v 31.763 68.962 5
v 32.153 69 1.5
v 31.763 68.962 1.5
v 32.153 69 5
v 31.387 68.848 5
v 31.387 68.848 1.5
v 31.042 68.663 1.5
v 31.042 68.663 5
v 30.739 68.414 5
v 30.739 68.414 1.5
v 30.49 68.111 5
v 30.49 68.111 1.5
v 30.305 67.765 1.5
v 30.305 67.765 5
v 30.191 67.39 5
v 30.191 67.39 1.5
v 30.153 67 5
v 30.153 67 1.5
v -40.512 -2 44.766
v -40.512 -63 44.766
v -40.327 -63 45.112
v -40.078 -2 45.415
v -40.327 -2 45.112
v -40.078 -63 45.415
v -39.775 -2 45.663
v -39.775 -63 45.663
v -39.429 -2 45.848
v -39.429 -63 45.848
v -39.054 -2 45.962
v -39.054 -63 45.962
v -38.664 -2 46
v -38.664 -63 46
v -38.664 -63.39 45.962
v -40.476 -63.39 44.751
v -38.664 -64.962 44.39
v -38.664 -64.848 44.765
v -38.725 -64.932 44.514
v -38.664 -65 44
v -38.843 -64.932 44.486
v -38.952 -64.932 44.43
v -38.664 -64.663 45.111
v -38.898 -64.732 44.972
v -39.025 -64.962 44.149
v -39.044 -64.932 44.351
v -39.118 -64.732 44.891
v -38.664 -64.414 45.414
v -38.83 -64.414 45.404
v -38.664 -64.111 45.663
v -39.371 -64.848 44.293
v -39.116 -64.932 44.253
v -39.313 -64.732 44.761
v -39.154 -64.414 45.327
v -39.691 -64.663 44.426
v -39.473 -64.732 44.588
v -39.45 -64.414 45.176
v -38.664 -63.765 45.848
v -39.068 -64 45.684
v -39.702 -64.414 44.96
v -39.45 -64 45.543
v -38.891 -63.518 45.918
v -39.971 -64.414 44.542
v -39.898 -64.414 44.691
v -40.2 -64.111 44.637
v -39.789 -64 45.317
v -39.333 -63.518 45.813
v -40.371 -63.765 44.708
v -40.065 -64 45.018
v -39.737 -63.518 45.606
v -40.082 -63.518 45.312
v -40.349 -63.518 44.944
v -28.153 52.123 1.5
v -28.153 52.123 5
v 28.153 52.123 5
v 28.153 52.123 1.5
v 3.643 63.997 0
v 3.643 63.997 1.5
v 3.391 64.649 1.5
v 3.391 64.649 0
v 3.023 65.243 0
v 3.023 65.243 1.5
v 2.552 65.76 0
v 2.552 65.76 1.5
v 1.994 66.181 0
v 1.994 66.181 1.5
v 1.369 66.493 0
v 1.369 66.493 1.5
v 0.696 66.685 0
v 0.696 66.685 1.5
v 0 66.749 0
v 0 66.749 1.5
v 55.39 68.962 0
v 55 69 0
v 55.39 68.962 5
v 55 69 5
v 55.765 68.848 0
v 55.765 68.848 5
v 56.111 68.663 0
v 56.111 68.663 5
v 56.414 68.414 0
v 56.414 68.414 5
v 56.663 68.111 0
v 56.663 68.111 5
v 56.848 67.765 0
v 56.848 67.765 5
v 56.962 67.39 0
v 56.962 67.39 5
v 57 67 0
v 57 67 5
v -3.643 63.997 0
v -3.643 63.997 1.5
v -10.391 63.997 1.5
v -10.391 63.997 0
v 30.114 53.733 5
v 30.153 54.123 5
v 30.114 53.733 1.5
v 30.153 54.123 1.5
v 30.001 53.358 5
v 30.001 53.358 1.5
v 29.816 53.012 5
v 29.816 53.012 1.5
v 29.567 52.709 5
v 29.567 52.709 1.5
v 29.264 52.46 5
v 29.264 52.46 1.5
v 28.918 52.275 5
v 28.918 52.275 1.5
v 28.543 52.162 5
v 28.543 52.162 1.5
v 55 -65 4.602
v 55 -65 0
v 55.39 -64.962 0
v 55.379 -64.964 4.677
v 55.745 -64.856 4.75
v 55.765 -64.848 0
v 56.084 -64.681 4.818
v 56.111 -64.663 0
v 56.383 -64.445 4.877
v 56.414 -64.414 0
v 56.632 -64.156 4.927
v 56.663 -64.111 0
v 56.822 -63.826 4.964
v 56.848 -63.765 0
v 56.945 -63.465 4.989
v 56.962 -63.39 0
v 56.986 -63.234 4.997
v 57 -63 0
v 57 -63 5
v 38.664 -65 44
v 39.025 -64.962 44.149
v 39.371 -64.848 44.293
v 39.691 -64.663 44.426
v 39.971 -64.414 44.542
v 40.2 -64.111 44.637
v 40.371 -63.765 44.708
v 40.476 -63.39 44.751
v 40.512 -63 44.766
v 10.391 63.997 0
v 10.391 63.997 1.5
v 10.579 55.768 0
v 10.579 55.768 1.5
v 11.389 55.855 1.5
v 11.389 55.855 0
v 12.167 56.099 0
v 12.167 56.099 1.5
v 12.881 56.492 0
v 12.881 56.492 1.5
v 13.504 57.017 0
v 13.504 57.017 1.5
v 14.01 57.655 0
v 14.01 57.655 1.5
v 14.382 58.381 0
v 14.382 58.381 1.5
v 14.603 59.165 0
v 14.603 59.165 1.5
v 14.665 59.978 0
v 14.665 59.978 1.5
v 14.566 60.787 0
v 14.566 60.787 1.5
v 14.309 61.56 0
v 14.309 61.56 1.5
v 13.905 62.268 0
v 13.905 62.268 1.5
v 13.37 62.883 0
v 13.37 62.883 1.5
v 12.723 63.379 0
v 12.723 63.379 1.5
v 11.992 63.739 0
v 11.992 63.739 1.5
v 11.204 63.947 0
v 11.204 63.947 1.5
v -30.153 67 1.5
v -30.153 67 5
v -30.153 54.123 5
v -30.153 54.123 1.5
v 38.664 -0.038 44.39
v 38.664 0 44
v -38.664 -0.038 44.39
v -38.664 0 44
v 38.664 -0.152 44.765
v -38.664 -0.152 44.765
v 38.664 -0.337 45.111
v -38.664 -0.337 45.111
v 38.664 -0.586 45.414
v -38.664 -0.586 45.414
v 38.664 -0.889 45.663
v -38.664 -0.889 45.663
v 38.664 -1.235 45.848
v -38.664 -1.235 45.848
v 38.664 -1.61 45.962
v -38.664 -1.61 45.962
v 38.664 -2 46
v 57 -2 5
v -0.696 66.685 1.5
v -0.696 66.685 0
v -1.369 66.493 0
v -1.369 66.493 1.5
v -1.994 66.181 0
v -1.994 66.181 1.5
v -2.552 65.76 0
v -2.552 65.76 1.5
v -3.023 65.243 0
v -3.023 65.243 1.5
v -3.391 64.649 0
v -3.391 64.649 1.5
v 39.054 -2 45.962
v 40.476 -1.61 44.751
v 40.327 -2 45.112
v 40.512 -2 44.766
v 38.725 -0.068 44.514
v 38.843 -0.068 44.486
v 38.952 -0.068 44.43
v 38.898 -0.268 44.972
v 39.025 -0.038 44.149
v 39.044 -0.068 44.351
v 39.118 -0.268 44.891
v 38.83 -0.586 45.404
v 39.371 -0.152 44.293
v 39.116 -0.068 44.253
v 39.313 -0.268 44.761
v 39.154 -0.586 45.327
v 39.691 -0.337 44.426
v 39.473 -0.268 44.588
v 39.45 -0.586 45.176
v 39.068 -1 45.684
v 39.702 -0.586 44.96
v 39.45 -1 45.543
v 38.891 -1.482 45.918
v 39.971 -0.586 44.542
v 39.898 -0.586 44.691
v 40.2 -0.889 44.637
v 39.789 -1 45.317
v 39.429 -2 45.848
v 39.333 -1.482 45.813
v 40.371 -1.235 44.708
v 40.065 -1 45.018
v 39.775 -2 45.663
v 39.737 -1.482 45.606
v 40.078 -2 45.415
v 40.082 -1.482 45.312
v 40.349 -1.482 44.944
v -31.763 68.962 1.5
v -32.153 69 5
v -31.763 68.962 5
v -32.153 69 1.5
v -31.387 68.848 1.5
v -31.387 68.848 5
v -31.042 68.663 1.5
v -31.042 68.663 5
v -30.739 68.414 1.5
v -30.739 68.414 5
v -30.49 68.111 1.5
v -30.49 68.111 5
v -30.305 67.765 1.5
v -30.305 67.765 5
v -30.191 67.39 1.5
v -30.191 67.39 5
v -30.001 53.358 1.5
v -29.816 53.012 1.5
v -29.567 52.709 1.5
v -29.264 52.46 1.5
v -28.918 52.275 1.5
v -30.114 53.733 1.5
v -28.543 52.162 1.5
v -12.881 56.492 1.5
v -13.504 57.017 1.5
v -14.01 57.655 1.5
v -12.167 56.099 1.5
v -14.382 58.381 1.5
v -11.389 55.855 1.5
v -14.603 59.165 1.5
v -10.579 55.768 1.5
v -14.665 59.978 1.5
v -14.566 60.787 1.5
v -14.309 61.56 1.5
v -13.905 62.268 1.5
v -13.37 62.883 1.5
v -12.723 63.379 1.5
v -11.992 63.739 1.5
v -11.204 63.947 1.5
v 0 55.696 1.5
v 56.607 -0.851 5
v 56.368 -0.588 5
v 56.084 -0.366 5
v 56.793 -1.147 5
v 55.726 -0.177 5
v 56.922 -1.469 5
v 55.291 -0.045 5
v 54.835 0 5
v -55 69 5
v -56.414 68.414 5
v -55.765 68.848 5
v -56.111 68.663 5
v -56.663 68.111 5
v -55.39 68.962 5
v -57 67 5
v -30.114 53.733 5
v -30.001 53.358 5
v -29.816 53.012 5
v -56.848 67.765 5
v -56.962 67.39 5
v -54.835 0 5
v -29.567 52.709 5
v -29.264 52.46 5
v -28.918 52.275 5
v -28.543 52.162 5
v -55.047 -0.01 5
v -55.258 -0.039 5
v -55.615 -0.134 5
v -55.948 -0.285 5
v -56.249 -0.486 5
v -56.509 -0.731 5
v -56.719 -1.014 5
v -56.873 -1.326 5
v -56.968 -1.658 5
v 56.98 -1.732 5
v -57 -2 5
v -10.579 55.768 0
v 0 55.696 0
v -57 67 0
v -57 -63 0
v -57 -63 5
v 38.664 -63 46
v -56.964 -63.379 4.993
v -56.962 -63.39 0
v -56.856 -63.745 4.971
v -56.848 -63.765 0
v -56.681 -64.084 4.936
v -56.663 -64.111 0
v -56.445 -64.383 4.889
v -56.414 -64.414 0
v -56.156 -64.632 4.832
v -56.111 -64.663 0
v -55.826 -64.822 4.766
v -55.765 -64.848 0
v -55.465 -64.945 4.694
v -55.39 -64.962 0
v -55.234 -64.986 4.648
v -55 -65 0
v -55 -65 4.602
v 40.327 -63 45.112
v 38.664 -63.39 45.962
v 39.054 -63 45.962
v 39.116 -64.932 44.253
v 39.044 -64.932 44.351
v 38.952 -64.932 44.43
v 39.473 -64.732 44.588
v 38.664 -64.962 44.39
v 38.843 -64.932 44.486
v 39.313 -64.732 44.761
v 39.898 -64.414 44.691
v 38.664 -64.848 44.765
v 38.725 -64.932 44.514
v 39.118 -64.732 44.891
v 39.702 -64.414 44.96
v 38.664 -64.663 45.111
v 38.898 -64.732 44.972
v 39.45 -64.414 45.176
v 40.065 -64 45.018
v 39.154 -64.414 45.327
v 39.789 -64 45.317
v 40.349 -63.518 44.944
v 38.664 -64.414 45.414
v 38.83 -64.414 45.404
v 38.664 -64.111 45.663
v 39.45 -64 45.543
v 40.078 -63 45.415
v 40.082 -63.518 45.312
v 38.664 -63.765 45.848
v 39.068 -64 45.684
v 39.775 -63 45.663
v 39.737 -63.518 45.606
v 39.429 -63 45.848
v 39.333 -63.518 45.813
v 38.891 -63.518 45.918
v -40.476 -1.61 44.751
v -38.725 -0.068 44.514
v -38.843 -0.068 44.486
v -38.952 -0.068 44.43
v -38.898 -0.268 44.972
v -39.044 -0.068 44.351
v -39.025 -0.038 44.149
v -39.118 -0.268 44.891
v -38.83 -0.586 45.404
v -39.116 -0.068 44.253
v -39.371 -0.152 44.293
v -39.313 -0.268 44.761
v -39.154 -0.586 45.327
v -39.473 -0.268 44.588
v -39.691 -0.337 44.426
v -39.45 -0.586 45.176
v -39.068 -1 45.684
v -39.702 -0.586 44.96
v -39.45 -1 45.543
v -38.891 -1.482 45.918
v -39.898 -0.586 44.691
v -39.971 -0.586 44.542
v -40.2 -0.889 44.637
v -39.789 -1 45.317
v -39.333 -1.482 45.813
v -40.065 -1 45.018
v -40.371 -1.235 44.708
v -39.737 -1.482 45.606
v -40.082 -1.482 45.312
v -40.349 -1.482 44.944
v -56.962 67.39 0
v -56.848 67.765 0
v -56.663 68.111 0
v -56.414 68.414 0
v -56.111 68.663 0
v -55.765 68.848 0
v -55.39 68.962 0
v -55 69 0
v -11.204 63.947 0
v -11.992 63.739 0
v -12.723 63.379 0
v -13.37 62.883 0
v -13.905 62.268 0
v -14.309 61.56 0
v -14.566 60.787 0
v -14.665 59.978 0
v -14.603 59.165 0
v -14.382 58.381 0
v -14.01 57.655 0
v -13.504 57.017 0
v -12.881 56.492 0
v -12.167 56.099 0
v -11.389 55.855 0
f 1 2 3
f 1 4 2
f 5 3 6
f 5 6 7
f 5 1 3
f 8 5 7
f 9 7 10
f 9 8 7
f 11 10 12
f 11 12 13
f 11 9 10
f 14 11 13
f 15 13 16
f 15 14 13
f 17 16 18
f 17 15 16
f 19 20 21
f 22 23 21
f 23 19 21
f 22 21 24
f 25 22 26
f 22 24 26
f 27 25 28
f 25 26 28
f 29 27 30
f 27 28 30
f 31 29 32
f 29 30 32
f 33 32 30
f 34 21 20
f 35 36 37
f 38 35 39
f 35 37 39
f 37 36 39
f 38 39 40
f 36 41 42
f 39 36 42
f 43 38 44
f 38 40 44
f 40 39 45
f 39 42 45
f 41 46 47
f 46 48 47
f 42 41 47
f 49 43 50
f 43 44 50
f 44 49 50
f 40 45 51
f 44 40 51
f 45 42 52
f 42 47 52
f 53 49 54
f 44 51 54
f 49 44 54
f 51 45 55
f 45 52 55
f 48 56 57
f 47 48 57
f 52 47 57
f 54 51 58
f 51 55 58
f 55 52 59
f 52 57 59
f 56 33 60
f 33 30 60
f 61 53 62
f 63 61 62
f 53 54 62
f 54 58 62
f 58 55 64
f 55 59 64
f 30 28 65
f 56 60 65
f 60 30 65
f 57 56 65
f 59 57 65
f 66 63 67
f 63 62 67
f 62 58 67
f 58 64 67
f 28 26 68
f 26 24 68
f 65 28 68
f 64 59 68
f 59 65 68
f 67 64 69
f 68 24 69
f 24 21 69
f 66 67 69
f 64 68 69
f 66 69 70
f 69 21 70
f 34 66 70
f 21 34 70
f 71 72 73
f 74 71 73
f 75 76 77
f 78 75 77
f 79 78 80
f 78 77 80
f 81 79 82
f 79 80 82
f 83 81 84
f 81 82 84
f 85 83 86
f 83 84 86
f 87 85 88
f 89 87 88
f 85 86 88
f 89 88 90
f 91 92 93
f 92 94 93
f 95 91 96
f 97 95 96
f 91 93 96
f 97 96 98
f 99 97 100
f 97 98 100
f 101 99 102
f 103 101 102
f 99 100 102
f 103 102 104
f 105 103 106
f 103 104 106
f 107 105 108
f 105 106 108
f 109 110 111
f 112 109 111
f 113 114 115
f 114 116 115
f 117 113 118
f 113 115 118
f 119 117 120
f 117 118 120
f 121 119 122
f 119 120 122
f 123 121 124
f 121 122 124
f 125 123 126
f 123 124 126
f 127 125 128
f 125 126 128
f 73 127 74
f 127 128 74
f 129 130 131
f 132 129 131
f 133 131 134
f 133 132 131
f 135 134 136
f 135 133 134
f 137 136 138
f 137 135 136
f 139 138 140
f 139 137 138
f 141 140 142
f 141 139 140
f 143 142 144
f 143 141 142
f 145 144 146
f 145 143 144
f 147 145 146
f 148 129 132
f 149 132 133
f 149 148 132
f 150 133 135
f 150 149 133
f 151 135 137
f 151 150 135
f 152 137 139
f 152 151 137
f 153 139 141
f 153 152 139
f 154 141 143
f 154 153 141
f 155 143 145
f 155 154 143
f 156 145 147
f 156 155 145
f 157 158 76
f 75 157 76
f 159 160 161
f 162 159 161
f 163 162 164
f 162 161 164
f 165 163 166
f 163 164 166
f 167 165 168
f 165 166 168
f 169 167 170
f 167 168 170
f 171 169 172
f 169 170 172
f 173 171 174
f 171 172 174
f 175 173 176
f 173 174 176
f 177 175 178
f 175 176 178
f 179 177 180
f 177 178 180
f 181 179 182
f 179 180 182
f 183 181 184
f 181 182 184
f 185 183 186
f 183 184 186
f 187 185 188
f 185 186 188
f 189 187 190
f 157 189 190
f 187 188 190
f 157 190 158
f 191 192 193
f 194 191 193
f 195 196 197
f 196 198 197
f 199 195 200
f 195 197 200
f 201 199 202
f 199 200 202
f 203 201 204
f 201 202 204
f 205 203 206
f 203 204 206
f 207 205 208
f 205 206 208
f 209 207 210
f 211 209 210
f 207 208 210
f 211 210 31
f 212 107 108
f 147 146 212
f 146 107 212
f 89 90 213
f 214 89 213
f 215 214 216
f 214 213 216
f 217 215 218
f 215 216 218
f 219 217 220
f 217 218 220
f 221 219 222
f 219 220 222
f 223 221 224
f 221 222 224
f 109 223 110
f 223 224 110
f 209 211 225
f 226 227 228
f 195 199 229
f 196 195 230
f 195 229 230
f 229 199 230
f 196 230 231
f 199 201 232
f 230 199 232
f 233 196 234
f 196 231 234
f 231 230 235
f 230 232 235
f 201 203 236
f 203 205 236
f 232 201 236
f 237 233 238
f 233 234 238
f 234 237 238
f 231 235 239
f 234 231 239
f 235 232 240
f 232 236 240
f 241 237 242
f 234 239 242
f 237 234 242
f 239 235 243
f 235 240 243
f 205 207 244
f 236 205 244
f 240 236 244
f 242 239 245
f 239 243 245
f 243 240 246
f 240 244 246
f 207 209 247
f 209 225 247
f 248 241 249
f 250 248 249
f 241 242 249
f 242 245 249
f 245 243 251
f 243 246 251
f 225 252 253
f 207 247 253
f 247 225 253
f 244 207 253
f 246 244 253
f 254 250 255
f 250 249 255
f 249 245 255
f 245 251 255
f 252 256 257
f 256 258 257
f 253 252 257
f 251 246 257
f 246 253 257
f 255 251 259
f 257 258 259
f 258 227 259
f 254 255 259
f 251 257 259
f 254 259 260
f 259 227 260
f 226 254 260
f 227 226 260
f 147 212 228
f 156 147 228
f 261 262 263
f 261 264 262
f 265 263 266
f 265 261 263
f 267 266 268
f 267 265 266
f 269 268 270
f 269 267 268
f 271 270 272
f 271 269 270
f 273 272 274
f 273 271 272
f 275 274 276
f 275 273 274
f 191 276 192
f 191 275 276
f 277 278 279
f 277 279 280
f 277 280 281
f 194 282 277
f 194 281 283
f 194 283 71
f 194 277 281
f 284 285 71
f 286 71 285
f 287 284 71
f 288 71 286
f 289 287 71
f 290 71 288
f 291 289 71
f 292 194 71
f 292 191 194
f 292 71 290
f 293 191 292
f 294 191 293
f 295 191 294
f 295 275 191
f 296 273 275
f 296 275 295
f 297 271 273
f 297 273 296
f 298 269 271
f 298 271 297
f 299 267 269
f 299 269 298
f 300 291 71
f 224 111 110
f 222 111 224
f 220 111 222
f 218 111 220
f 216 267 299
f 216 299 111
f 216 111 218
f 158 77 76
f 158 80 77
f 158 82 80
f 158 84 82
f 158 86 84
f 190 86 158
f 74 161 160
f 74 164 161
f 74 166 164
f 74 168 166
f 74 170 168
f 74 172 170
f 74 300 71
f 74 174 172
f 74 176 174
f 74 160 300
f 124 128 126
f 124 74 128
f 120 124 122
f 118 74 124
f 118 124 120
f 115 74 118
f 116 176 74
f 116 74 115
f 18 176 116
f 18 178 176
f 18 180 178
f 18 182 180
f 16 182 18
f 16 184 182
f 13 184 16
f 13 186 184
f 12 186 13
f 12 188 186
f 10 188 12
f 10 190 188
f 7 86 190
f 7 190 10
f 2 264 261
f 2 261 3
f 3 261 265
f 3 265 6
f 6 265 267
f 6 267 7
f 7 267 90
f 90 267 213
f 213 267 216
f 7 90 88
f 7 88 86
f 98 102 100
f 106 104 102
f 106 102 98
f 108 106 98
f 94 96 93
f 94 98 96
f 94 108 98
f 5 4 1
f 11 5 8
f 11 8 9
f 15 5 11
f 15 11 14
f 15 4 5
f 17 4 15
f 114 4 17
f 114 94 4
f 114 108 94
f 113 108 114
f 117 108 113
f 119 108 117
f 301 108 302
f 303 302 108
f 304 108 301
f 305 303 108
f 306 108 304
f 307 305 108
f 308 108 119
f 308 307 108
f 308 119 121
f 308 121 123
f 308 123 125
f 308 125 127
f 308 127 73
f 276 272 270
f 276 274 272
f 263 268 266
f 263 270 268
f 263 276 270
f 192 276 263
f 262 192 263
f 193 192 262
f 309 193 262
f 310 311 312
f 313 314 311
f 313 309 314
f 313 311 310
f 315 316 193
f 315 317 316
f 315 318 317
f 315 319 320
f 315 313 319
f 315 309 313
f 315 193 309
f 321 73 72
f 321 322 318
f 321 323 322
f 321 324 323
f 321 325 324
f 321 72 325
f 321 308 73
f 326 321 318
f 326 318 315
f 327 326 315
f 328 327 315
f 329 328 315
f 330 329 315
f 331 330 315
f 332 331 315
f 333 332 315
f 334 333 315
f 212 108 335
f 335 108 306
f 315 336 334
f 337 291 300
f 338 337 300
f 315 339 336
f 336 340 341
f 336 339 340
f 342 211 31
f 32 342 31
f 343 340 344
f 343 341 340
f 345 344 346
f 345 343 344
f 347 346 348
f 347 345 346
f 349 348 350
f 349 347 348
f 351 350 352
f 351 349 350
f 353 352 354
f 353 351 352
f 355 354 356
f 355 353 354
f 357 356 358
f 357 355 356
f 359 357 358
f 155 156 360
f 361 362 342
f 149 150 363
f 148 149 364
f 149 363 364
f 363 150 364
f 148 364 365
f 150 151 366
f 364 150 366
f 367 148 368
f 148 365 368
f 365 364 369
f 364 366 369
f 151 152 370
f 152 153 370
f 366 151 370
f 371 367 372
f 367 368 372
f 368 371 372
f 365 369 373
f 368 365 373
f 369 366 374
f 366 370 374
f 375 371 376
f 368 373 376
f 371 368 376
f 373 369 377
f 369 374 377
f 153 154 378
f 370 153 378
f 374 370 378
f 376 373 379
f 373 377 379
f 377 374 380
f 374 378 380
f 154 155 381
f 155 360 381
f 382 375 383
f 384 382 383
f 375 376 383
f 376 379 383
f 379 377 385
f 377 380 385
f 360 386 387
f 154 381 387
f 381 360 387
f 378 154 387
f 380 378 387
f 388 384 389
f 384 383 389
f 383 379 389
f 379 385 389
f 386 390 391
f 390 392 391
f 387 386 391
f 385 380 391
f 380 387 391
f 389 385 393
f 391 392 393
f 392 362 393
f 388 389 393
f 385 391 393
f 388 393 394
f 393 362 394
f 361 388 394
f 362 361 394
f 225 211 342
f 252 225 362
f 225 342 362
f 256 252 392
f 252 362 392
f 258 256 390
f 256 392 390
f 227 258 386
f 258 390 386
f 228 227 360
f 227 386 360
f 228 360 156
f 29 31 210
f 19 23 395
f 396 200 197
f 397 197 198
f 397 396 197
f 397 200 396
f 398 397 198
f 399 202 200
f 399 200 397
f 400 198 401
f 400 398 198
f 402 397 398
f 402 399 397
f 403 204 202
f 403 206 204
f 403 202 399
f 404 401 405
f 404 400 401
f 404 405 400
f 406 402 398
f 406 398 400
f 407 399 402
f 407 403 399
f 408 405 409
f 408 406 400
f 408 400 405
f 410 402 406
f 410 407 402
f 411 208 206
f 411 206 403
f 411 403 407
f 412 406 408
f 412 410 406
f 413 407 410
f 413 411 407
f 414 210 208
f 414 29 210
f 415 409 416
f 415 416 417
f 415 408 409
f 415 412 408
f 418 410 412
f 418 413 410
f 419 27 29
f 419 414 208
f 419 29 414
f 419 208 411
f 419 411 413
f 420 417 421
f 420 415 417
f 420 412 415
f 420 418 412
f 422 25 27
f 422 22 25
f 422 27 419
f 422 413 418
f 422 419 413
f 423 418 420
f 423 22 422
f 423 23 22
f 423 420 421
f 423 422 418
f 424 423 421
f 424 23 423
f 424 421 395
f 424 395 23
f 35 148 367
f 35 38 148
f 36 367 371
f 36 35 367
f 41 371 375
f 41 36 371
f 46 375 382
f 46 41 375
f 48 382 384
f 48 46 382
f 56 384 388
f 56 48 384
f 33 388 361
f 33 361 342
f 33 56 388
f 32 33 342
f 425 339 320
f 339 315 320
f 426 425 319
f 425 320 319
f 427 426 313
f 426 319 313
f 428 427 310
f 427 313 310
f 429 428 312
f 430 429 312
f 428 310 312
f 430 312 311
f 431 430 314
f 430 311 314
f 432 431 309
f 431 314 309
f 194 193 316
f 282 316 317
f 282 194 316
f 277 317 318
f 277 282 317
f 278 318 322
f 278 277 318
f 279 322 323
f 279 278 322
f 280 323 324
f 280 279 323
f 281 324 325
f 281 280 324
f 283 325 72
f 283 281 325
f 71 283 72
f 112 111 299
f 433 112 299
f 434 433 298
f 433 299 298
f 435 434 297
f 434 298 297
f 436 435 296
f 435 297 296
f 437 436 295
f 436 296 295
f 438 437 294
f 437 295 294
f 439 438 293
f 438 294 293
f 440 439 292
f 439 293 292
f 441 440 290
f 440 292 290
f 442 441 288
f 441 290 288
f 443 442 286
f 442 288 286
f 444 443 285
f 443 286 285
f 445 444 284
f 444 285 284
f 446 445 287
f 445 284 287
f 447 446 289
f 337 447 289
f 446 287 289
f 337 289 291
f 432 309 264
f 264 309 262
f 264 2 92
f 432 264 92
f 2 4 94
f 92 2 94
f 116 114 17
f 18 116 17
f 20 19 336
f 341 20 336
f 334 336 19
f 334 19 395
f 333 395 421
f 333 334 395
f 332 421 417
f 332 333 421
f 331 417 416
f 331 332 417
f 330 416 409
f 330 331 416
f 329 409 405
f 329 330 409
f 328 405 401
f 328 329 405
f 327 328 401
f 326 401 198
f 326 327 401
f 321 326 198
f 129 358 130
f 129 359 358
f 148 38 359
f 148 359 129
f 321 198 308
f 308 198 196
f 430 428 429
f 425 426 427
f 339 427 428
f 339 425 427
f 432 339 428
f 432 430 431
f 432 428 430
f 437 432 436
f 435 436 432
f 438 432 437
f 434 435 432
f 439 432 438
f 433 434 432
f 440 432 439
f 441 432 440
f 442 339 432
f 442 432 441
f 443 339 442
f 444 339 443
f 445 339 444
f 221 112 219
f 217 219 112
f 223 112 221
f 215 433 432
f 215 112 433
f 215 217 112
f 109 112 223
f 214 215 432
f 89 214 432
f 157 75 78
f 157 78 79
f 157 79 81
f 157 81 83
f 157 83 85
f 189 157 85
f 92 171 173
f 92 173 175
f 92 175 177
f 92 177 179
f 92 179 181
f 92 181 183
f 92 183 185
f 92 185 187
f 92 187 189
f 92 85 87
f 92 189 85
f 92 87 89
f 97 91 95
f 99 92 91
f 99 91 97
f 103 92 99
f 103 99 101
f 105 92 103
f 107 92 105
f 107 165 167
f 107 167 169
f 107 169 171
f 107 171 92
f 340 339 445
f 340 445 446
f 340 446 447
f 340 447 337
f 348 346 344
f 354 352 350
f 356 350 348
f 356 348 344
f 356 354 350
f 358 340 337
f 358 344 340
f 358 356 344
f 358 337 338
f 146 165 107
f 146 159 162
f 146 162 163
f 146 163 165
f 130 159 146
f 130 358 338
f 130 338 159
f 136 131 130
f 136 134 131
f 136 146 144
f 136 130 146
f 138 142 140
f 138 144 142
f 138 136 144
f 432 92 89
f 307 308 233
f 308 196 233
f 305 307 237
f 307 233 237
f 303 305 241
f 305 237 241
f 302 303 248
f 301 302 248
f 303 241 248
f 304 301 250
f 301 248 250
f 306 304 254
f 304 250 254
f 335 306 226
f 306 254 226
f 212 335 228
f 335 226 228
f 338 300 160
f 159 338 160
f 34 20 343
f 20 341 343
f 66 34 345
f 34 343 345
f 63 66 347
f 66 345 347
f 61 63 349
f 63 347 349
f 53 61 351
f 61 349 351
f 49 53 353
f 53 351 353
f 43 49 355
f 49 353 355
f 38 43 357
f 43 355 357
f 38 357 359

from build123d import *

# Parameters (mm, degrees)
F1_DEPTH      = 65
F2_W          = 57
F2_H          = 5
F3_DEPTH      = 65
F3_DEPTH_BACK = 69
F6_DEPTH      = 3.5
F8_DEPTH      = 12.5
F9_R          = 2


with BuildPart() as f1:
    # F0 (on Front) → F1 (new body)
    with BuildSketch(Plane.XZ):
        Polygon((40, 46), (0, 46), (-40, 46), (-57, 5), (0, 5), (57, 5), align=None)
    extrude(amount=F1_DEPTH)

    # F2 (on Front) → F3 (join, two sides)
    with BuildSketch(Plane.XZ) as f3_sk:
        with Locations((-28.5, 2.5)):
            Rectangle(F2_W, F2_H)
        with Locations((28.5, 2.5)):
            Rectangle(F2_W, F2_H)
    extrude(amount=F3_DEPTH)
    extrude(f3_sk.sketch, amount=-F3_DEPTH_BACK)

    # F5 (on offset) → F6 (cut)
    with BuildSketch(Plane.XY.offset(5)):
        Polygon((30.152792, 69.905717), (0, 69.905717), (-30.152792, 69.905717), (-30.152792, 52.123178), (0, 52.123178), (30.152792, 52.123178), align=None)
    extrude(amount=-F6_DEPTH, mode=Mode.SUBTRACT)

    # F7 (on offset) → F8 (cut, symmetric)
    with BuildSketch(Plane.XY.offset(5)):
        with BuildLine():
            Line((-3.643007, 63.996591), (-10.390692, 63.996591))
            ThreePointArc((-10.390692, 63.996591), (-14.664988, 59.978003), (-10.578685, 55.768397))
            Line((-10.578685, 55.768397), (0, 55.695605))
            Line((0, 55.695605), (10.578685, 55.768397))
            ThreePointArc((10.578685, 55.768397), (14.664988, 59.978003), (10.390692, 63.996591))
            Line((10.390692, 63.996591), (3.643007, 63.996591))
            ThreePointArc((3.643007, 63.996591), (2.282959, 65.983581), (0, 66.749063))
            ThreePointArc((0, 66.749063), (-2.282959, 65.983581), (-3.643007, 63.996591))
        make_face()
    extrude(amount=F8_DEPTH, both=True, mode=Mode.SUBTRACT)

    # F9
    f9_edges = [f1.edges().sort_by_distance(p)[0] for p in [
        (40, -32.5, 46),
        (-40, -32.5, 46),
        (0, 0, 46),
        (-48.5, 0, 25.5),
        (48.5, 0, 25.5),
        (48.5, -65, 25.5),
        (0, -65, 46),
        (-48.5, -65, 25.5),
        (30.152792, 52.123178, 3.25),
        (-30.152792, 52.123178, 3.25),
        (30.152792, 69, 3.25),
        (-30.152792, 69, 3.25),
        (-57, 69, 2.5),
        (57, 69, 2.5),
        (-57, -65, 2.5),
        (57, -65, 2.5),
    ]]
    fillet(f9_edges, radius=F9_R)


solid = f1.part
